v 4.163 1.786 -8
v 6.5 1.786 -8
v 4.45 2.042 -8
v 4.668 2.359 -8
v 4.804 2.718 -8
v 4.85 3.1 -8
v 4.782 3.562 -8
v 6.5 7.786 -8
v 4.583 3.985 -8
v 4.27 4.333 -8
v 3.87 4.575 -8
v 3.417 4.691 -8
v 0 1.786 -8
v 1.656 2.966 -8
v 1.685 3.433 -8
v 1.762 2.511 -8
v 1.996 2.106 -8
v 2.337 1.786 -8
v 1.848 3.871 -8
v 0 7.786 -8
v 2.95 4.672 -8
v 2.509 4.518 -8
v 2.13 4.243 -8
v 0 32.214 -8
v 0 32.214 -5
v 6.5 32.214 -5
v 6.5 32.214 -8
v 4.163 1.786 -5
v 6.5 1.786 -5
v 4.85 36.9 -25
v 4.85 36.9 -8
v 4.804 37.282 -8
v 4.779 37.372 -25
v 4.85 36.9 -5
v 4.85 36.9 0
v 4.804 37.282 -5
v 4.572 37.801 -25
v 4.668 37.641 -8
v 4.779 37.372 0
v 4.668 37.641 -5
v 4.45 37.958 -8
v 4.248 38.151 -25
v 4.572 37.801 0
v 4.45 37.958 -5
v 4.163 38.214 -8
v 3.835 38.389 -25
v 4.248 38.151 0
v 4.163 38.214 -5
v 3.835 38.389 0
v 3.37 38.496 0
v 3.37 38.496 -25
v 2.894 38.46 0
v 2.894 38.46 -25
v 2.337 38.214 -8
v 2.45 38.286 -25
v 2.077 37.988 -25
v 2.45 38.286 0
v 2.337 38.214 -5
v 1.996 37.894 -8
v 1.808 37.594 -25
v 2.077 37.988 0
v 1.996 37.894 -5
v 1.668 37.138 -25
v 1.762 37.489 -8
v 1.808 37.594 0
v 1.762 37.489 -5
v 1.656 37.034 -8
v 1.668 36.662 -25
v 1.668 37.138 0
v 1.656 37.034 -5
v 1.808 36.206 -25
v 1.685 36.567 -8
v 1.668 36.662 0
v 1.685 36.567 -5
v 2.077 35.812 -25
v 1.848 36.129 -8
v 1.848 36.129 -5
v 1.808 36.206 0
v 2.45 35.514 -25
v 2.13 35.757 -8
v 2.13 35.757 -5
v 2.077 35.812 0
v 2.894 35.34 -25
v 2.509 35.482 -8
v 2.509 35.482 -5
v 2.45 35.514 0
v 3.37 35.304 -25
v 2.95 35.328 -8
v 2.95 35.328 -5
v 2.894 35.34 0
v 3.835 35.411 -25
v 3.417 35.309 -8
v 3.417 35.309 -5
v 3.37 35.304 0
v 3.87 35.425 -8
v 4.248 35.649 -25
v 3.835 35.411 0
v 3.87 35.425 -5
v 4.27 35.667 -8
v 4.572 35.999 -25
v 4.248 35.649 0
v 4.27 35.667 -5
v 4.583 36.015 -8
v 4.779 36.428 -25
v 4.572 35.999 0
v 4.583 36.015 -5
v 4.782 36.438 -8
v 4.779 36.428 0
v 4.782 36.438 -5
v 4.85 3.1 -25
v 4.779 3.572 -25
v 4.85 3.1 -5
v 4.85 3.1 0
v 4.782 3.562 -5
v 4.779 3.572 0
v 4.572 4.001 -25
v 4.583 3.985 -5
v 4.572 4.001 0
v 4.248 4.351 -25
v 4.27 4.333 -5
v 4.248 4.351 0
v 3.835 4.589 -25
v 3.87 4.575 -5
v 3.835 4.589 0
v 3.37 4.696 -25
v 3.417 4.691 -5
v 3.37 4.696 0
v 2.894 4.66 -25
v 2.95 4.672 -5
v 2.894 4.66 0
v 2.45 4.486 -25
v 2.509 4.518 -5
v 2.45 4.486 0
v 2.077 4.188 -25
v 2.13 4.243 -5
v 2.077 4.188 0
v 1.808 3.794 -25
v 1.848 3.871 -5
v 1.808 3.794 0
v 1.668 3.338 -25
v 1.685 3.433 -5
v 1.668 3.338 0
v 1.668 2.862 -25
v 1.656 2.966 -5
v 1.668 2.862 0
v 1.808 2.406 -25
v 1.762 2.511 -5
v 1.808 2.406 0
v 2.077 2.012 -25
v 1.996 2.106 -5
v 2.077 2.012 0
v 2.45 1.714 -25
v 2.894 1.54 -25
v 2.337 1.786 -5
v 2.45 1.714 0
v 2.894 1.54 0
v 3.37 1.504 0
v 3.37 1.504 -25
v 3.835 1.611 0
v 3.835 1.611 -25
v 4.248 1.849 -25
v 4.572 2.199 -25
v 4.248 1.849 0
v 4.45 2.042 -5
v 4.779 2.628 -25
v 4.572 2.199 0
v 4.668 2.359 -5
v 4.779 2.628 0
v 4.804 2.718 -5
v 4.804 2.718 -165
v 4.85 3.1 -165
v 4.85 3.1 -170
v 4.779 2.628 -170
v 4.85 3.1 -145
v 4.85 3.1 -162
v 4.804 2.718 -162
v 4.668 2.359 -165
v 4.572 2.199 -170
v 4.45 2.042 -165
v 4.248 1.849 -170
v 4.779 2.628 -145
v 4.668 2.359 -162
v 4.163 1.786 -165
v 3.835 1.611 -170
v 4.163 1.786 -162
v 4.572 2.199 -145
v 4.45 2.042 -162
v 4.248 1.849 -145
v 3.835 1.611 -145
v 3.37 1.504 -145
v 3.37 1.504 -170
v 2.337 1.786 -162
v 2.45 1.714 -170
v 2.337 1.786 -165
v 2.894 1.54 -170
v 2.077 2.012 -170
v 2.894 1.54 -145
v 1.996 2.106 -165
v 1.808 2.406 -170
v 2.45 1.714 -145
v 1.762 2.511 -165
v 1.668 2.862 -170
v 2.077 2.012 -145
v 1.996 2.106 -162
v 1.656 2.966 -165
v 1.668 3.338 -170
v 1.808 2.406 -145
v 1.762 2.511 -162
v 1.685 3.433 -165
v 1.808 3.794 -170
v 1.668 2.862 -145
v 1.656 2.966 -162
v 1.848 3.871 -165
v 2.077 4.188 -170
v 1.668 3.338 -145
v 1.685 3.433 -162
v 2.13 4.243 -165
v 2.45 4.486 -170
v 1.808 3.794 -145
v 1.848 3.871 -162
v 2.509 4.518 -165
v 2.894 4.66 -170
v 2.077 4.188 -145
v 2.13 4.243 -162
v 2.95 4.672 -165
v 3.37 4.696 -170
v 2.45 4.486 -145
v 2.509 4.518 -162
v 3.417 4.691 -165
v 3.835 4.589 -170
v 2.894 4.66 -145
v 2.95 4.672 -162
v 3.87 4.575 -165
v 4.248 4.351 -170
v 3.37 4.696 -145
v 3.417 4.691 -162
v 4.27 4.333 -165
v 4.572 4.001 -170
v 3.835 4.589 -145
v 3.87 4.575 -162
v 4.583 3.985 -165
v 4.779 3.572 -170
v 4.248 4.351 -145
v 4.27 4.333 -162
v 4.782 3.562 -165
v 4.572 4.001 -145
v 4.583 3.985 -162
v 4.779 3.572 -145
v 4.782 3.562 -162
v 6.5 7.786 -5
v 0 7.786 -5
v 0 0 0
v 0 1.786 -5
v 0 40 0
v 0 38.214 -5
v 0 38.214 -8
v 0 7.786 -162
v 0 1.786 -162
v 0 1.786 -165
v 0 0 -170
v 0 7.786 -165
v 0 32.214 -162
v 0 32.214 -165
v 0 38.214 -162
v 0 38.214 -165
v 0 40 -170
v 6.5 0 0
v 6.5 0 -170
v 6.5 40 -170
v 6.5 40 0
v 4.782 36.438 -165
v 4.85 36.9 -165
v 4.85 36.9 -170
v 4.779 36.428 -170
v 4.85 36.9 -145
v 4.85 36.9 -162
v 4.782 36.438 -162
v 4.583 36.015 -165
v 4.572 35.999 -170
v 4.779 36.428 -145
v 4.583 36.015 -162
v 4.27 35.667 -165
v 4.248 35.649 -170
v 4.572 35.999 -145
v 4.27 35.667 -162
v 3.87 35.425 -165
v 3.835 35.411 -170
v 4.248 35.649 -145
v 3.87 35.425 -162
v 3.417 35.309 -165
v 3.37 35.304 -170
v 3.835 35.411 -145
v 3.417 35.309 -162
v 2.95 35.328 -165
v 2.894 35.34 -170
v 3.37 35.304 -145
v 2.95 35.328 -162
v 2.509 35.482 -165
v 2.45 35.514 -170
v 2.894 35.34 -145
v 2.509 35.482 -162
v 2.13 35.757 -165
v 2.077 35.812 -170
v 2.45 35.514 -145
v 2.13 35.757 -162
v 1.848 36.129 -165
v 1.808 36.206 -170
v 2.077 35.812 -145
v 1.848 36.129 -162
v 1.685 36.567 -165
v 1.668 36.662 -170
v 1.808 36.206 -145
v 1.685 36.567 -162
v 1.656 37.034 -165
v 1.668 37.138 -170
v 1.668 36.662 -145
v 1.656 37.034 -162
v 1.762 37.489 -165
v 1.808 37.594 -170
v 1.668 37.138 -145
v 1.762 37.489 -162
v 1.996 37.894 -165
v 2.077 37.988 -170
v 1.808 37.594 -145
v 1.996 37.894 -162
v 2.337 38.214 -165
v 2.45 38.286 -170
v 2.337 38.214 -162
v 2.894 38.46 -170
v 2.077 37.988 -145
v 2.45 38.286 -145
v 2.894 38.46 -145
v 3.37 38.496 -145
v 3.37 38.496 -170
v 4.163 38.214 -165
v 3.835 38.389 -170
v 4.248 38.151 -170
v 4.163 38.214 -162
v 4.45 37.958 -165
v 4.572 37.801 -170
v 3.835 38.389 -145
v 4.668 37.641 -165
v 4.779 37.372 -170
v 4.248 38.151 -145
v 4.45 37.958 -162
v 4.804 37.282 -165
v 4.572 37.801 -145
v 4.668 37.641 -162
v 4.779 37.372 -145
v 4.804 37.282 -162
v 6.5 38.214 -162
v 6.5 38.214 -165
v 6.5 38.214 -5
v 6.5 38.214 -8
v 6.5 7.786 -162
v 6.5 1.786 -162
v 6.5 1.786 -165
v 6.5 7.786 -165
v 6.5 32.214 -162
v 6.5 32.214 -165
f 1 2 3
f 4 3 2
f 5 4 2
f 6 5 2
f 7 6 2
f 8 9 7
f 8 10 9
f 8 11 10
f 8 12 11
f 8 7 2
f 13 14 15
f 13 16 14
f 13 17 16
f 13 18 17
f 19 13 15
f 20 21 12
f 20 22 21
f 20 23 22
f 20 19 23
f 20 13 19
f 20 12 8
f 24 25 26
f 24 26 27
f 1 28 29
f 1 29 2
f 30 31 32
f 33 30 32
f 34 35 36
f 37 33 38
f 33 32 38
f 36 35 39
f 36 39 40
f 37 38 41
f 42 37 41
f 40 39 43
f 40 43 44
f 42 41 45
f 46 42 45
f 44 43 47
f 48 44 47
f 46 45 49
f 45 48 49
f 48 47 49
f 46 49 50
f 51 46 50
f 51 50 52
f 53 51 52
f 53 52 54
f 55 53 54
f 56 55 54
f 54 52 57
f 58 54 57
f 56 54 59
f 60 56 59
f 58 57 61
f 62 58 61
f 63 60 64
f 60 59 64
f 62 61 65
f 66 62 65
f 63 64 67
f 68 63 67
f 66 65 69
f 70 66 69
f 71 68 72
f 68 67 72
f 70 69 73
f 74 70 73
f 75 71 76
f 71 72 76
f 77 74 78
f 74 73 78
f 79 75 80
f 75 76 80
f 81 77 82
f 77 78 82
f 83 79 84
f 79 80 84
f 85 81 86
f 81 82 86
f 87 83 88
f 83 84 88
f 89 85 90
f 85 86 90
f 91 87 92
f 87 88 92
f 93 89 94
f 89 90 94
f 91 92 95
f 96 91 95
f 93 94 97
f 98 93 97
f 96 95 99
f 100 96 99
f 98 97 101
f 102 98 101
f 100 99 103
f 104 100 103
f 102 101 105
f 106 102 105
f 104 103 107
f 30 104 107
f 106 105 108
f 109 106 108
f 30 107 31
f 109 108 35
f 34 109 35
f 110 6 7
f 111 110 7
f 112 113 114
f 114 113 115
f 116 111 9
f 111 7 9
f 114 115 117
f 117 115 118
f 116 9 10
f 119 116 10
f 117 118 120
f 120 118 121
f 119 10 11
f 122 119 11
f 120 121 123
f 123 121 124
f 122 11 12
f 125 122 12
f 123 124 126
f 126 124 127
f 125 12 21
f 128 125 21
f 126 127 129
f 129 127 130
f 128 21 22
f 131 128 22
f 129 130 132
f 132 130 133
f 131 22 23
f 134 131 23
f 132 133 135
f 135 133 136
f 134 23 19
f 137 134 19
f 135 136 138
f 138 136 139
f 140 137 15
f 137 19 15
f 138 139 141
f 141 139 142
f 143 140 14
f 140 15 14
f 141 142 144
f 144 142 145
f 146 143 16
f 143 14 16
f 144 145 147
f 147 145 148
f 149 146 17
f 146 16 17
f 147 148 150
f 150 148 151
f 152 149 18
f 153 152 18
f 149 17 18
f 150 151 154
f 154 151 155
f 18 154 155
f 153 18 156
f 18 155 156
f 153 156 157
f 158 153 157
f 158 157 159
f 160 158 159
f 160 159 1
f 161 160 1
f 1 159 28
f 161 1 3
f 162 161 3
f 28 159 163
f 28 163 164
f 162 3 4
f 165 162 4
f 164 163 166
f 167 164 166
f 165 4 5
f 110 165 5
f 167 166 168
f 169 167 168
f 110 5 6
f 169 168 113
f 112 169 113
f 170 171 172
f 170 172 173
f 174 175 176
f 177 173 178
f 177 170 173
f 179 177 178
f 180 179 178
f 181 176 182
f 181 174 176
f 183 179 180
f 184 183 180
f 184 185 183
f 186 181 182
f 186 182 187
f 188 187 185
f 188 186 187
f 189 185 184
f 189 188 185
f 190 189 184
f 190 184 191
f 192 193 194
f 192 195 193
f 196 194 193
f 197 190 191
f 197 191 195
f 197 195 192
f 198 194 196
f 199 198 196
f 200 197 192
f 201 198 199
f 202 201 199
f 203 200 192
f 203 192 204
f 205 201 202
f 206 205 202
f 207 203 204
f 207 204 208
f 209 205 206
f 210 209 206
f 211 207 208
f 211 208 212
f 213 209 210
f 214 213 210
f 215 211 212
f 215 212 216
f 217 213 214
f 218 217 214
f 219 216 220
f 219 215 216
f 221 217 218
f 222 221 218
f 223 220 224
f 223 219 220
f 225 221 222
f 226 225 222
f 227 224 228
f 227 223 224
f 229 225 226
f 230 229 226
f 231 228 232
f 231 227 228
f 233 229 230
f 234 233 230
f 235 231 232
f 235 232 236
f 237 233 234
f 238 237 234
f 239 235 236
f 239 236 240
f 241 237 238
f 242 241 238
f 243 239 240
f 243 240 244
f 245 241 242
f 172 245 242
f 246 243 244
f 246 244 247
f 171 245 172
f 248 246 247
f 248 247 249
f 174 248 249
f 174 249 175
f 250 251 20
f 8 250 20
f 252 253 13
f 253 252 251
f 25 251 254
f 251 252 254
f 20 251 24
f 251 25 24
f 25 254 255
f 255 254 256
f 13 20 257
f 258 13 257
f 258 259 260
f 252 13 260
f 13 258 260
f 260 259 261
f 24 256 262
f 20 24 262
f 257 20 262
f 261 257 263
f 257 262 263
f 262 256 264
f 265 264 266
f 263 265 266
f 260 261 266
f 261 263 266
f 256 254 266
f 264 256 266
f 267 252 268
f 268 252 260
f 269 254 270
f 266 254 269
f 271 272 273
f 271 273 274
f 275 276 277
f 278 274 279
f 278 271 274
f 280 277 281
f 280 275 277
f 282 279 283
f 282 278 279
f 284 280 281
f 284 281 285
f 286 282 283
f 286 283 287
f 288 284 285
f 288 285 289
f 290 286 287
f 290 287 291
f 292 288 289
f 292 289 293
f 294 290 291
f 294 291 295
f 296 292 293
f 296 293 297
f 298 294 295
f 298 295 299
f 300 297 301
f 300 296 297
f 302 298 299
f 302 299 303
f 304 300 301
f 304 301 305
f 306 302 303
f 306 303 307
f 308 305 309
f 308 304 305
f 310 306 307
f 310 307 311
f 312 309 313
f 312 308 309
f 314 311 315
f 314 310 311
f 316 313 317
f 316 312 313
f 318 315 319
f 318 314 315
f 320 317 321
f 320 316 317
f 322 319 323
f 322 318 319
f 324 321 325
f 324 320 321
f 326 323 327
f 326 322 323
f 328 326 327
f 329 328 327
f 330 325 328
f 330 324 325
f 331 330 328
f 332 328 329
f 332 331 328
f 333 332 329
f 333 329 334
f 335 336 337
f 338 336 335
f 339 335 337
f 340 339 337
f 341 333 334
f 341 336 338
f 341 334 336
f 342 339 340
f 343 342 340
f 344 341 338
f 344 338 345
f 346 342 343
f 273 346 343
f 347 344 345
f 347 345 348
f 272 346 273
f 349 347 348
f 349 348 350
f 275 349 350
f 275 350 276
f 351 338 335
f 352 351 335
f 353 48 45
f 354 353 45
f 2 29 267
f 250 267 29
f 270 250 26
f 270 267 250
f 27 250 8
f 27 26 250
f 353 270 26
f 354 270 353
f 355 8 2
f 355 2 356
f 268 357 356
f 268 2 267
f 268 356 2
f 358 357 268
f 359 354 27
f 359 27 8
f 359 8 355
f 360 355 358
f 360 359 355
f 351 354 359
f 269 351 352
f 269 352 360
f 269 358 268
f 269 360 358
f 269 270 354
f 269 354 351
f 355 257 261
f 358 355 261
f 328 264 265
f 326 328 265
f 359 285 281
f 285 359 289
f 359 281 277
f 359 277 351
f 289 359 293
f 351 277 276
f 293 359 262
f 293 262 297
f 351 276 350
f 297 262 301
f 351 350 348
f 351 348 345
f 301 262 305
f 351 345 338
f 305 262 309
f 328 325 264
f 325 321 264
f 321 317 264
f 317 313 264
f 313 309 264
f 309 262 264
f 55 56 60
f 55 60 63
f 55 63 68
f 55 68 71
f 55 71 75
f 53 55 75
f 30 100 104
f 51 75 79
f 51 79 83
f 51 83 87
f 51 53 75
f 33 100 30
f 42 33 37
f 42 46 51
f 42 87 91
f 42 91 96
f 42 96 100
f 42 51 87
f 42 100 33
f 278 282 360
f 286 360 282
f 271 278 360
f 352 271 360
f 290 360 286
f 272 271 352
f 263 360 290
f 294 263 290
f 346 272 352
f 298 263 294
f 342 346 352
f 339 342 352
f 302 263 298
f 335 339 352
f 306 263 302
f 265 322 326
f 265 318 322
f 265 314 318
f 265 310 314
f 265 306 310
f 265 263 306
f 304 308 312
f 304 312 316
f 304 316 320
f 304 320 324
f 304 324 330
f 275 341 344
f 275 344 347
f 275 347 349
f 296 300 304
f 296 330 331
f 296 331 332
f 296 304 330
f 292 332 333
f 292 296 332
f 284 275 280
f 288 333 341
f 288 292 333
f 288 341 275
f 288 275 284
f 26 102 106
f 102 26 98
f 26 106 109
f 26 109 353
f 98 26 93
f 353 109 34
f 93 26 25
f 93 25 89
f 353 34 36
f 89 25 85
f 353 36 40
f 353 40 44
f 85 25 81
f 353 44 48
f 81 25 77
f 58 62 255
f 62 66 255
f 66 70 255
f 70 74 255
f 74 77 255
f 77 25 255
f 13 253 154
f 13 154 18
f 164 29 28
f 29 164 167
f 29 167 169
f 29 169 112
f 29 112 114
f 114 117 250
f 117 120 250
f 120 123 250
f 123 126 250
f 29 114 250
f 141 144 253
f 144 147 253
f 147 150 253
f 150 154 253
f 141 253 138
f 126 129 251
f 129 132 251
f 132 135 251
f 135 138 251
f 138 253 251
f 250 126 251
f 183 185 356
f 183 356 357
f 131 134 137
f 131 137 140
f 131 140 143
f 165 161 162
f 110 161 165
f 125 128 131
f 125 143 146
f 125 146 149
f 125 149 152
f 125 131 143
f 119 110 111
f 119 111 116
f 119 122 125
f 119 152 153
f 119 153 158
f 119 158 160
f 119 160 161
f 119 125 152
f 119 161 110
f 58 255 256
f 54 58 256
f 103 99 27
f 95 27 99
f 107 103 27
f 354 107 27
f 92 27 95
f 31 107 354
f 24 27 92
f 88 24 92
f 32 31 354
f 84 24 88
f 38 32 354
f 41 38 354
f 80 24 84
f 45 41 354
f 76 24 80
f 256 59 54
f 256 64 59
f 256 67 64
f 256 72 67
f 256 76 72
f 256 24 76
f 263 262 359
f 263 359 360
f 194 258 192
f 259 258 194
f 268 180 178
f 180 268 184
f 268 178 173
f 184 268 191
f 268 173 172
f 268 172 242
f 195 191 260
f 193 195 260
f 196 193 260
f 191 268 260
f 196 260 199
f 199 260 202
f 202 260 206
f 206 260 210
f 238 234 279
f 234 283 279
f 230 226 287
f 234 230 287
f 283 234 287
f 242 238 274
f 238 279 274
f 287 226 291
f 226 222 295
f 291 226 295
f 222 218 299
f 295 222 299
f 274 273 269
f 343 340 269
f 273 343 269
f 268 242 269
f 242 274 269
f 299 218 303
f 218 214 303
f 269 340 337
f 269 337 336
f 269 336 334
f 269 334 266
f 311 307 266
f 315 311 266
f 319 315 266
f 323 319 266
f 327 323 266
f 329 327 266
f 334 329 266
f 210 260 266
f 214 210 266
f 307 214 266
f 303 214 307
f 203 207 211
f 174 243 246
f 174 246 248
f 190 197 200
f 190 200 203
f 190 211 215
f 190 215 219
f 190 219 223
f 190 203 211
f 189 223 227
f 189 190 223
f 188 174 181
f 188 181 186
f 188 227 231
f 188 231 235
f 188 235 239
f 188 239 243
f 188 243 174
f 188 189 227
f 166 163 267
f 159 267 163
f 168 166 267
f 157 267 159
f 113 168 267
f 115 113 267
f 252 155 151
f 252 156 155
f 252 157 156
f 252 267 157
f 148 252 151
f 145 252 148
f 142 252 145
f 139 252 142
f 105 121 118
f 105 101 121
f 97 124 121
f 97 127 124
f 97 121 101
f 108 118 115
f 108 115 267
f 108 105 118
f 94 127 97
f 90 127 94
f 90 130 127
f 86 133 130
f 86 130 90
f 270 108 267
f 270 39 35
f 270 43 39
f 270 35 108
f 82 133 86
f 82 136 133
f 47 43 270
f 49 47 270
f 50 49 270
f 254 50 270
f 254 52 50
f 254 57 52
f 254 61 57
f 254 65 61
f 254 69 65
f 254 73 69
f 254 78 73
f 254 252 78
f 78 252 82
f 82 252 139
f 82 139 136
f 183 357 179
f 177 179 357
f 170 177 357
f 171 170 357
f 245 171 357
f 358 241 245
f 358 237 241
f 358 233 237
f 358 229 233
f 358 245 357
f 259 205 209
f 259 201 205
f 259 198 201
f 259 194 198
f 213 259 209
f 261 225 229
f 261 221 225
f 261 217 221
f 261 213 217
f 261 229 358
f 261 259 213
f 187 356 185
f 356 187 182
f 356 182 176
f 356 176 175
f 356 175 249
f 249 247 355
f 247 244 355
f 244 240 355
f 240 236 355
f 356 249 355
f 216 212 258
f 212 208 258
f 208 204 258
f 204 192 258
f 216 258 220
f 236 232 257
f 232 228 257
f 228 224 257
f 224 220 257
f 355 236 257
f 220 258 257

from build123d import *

# Parameters (mm, degrees)
SKETCH_1_W          = 170
SKETCH_1_H          = 40
SKETCH_1_W_2        = 3
SKETCH_1_H_2        = 6
EXTRUDE_2_DEPTH     = 6.5
SKETCH_4_R          = 1.6
CUT_EXTRUDE_1_DEPTH = 25
CUT_EXTRUDE_START   = -25
SKETCH_5_R          = 1.6
CUT_EXTRUDE_2_DEPTH = 25


with BuildPart() as part:
    # 草图1 → 凸台-拉伸2 (new body)
    with BuildSketch(Plane(origin=(0, 0, 0), x_dir=(0, 0, -1), z_dir=(1, 0, 0))):
        with Locations((85, 20)):
            Rectangle(SKETCH_1_W, SKETCH_1_H)
        with Locations((6.5, 4.78605941)):
            Rectangle(SKETCH_1_W_2, SKETCH_1_H_2, mode=Mode.SUBTRACT)
        with Locations((6.5, 35.21394059)):
            Rectangle(SKETCH_1_W_2, SKETCH_1_H_2, mode=Mode.SUBTRACT)
        with Locations((163.5, 4.78605941)):
            Rectangle(SKETCH_1_W_2, SKETCH_1_H_2, mode=Mode.SUBTRACT)
        with Locations((163.5, 35.21394059)):
            Rectangle(SKETCH_1_W_2, SKETCH_1_H_2, mode=Mode.SUBTRACT)
    extrude(amount=EXTRUDE_2_DEPTH)

    # 草图4 → 切除-拉伸1 (cut)
    with BuildSketch(Plane.XY):
        with Locations((3.25, 36.9)):
            Circle(SKETCH_4_R)
        with Locations((3.25, 3.1)):
            Circle(SKETCH_4_R)
    extrude(amount=-CUT_EXTRUDE_1_DEPTH, mode=Mode.SUBTRACT)

    # 草图5 → 切除-拉伸2 (cut)
    with BuildSketch(Plane(origin=(0, 0, -170), x_dir=(-1, 0, 0), z_dir=(0, 0, -1)).offset(CUT_EXTRUDE_START)):
        with Locations(Location((-3.25, 36.9, 0), (0, 0, 180))):
            Circle(SKETCH_5_R)
        with Locations(Location((-3.25, 3.1, 0), (0, 0, 180))):
            Circle(SKETCH_5_R)
    extrude(amount=CUT_EXTRUDE_2_DEPTH, mode=Mode.SUBTRACT)


solid = part.part
